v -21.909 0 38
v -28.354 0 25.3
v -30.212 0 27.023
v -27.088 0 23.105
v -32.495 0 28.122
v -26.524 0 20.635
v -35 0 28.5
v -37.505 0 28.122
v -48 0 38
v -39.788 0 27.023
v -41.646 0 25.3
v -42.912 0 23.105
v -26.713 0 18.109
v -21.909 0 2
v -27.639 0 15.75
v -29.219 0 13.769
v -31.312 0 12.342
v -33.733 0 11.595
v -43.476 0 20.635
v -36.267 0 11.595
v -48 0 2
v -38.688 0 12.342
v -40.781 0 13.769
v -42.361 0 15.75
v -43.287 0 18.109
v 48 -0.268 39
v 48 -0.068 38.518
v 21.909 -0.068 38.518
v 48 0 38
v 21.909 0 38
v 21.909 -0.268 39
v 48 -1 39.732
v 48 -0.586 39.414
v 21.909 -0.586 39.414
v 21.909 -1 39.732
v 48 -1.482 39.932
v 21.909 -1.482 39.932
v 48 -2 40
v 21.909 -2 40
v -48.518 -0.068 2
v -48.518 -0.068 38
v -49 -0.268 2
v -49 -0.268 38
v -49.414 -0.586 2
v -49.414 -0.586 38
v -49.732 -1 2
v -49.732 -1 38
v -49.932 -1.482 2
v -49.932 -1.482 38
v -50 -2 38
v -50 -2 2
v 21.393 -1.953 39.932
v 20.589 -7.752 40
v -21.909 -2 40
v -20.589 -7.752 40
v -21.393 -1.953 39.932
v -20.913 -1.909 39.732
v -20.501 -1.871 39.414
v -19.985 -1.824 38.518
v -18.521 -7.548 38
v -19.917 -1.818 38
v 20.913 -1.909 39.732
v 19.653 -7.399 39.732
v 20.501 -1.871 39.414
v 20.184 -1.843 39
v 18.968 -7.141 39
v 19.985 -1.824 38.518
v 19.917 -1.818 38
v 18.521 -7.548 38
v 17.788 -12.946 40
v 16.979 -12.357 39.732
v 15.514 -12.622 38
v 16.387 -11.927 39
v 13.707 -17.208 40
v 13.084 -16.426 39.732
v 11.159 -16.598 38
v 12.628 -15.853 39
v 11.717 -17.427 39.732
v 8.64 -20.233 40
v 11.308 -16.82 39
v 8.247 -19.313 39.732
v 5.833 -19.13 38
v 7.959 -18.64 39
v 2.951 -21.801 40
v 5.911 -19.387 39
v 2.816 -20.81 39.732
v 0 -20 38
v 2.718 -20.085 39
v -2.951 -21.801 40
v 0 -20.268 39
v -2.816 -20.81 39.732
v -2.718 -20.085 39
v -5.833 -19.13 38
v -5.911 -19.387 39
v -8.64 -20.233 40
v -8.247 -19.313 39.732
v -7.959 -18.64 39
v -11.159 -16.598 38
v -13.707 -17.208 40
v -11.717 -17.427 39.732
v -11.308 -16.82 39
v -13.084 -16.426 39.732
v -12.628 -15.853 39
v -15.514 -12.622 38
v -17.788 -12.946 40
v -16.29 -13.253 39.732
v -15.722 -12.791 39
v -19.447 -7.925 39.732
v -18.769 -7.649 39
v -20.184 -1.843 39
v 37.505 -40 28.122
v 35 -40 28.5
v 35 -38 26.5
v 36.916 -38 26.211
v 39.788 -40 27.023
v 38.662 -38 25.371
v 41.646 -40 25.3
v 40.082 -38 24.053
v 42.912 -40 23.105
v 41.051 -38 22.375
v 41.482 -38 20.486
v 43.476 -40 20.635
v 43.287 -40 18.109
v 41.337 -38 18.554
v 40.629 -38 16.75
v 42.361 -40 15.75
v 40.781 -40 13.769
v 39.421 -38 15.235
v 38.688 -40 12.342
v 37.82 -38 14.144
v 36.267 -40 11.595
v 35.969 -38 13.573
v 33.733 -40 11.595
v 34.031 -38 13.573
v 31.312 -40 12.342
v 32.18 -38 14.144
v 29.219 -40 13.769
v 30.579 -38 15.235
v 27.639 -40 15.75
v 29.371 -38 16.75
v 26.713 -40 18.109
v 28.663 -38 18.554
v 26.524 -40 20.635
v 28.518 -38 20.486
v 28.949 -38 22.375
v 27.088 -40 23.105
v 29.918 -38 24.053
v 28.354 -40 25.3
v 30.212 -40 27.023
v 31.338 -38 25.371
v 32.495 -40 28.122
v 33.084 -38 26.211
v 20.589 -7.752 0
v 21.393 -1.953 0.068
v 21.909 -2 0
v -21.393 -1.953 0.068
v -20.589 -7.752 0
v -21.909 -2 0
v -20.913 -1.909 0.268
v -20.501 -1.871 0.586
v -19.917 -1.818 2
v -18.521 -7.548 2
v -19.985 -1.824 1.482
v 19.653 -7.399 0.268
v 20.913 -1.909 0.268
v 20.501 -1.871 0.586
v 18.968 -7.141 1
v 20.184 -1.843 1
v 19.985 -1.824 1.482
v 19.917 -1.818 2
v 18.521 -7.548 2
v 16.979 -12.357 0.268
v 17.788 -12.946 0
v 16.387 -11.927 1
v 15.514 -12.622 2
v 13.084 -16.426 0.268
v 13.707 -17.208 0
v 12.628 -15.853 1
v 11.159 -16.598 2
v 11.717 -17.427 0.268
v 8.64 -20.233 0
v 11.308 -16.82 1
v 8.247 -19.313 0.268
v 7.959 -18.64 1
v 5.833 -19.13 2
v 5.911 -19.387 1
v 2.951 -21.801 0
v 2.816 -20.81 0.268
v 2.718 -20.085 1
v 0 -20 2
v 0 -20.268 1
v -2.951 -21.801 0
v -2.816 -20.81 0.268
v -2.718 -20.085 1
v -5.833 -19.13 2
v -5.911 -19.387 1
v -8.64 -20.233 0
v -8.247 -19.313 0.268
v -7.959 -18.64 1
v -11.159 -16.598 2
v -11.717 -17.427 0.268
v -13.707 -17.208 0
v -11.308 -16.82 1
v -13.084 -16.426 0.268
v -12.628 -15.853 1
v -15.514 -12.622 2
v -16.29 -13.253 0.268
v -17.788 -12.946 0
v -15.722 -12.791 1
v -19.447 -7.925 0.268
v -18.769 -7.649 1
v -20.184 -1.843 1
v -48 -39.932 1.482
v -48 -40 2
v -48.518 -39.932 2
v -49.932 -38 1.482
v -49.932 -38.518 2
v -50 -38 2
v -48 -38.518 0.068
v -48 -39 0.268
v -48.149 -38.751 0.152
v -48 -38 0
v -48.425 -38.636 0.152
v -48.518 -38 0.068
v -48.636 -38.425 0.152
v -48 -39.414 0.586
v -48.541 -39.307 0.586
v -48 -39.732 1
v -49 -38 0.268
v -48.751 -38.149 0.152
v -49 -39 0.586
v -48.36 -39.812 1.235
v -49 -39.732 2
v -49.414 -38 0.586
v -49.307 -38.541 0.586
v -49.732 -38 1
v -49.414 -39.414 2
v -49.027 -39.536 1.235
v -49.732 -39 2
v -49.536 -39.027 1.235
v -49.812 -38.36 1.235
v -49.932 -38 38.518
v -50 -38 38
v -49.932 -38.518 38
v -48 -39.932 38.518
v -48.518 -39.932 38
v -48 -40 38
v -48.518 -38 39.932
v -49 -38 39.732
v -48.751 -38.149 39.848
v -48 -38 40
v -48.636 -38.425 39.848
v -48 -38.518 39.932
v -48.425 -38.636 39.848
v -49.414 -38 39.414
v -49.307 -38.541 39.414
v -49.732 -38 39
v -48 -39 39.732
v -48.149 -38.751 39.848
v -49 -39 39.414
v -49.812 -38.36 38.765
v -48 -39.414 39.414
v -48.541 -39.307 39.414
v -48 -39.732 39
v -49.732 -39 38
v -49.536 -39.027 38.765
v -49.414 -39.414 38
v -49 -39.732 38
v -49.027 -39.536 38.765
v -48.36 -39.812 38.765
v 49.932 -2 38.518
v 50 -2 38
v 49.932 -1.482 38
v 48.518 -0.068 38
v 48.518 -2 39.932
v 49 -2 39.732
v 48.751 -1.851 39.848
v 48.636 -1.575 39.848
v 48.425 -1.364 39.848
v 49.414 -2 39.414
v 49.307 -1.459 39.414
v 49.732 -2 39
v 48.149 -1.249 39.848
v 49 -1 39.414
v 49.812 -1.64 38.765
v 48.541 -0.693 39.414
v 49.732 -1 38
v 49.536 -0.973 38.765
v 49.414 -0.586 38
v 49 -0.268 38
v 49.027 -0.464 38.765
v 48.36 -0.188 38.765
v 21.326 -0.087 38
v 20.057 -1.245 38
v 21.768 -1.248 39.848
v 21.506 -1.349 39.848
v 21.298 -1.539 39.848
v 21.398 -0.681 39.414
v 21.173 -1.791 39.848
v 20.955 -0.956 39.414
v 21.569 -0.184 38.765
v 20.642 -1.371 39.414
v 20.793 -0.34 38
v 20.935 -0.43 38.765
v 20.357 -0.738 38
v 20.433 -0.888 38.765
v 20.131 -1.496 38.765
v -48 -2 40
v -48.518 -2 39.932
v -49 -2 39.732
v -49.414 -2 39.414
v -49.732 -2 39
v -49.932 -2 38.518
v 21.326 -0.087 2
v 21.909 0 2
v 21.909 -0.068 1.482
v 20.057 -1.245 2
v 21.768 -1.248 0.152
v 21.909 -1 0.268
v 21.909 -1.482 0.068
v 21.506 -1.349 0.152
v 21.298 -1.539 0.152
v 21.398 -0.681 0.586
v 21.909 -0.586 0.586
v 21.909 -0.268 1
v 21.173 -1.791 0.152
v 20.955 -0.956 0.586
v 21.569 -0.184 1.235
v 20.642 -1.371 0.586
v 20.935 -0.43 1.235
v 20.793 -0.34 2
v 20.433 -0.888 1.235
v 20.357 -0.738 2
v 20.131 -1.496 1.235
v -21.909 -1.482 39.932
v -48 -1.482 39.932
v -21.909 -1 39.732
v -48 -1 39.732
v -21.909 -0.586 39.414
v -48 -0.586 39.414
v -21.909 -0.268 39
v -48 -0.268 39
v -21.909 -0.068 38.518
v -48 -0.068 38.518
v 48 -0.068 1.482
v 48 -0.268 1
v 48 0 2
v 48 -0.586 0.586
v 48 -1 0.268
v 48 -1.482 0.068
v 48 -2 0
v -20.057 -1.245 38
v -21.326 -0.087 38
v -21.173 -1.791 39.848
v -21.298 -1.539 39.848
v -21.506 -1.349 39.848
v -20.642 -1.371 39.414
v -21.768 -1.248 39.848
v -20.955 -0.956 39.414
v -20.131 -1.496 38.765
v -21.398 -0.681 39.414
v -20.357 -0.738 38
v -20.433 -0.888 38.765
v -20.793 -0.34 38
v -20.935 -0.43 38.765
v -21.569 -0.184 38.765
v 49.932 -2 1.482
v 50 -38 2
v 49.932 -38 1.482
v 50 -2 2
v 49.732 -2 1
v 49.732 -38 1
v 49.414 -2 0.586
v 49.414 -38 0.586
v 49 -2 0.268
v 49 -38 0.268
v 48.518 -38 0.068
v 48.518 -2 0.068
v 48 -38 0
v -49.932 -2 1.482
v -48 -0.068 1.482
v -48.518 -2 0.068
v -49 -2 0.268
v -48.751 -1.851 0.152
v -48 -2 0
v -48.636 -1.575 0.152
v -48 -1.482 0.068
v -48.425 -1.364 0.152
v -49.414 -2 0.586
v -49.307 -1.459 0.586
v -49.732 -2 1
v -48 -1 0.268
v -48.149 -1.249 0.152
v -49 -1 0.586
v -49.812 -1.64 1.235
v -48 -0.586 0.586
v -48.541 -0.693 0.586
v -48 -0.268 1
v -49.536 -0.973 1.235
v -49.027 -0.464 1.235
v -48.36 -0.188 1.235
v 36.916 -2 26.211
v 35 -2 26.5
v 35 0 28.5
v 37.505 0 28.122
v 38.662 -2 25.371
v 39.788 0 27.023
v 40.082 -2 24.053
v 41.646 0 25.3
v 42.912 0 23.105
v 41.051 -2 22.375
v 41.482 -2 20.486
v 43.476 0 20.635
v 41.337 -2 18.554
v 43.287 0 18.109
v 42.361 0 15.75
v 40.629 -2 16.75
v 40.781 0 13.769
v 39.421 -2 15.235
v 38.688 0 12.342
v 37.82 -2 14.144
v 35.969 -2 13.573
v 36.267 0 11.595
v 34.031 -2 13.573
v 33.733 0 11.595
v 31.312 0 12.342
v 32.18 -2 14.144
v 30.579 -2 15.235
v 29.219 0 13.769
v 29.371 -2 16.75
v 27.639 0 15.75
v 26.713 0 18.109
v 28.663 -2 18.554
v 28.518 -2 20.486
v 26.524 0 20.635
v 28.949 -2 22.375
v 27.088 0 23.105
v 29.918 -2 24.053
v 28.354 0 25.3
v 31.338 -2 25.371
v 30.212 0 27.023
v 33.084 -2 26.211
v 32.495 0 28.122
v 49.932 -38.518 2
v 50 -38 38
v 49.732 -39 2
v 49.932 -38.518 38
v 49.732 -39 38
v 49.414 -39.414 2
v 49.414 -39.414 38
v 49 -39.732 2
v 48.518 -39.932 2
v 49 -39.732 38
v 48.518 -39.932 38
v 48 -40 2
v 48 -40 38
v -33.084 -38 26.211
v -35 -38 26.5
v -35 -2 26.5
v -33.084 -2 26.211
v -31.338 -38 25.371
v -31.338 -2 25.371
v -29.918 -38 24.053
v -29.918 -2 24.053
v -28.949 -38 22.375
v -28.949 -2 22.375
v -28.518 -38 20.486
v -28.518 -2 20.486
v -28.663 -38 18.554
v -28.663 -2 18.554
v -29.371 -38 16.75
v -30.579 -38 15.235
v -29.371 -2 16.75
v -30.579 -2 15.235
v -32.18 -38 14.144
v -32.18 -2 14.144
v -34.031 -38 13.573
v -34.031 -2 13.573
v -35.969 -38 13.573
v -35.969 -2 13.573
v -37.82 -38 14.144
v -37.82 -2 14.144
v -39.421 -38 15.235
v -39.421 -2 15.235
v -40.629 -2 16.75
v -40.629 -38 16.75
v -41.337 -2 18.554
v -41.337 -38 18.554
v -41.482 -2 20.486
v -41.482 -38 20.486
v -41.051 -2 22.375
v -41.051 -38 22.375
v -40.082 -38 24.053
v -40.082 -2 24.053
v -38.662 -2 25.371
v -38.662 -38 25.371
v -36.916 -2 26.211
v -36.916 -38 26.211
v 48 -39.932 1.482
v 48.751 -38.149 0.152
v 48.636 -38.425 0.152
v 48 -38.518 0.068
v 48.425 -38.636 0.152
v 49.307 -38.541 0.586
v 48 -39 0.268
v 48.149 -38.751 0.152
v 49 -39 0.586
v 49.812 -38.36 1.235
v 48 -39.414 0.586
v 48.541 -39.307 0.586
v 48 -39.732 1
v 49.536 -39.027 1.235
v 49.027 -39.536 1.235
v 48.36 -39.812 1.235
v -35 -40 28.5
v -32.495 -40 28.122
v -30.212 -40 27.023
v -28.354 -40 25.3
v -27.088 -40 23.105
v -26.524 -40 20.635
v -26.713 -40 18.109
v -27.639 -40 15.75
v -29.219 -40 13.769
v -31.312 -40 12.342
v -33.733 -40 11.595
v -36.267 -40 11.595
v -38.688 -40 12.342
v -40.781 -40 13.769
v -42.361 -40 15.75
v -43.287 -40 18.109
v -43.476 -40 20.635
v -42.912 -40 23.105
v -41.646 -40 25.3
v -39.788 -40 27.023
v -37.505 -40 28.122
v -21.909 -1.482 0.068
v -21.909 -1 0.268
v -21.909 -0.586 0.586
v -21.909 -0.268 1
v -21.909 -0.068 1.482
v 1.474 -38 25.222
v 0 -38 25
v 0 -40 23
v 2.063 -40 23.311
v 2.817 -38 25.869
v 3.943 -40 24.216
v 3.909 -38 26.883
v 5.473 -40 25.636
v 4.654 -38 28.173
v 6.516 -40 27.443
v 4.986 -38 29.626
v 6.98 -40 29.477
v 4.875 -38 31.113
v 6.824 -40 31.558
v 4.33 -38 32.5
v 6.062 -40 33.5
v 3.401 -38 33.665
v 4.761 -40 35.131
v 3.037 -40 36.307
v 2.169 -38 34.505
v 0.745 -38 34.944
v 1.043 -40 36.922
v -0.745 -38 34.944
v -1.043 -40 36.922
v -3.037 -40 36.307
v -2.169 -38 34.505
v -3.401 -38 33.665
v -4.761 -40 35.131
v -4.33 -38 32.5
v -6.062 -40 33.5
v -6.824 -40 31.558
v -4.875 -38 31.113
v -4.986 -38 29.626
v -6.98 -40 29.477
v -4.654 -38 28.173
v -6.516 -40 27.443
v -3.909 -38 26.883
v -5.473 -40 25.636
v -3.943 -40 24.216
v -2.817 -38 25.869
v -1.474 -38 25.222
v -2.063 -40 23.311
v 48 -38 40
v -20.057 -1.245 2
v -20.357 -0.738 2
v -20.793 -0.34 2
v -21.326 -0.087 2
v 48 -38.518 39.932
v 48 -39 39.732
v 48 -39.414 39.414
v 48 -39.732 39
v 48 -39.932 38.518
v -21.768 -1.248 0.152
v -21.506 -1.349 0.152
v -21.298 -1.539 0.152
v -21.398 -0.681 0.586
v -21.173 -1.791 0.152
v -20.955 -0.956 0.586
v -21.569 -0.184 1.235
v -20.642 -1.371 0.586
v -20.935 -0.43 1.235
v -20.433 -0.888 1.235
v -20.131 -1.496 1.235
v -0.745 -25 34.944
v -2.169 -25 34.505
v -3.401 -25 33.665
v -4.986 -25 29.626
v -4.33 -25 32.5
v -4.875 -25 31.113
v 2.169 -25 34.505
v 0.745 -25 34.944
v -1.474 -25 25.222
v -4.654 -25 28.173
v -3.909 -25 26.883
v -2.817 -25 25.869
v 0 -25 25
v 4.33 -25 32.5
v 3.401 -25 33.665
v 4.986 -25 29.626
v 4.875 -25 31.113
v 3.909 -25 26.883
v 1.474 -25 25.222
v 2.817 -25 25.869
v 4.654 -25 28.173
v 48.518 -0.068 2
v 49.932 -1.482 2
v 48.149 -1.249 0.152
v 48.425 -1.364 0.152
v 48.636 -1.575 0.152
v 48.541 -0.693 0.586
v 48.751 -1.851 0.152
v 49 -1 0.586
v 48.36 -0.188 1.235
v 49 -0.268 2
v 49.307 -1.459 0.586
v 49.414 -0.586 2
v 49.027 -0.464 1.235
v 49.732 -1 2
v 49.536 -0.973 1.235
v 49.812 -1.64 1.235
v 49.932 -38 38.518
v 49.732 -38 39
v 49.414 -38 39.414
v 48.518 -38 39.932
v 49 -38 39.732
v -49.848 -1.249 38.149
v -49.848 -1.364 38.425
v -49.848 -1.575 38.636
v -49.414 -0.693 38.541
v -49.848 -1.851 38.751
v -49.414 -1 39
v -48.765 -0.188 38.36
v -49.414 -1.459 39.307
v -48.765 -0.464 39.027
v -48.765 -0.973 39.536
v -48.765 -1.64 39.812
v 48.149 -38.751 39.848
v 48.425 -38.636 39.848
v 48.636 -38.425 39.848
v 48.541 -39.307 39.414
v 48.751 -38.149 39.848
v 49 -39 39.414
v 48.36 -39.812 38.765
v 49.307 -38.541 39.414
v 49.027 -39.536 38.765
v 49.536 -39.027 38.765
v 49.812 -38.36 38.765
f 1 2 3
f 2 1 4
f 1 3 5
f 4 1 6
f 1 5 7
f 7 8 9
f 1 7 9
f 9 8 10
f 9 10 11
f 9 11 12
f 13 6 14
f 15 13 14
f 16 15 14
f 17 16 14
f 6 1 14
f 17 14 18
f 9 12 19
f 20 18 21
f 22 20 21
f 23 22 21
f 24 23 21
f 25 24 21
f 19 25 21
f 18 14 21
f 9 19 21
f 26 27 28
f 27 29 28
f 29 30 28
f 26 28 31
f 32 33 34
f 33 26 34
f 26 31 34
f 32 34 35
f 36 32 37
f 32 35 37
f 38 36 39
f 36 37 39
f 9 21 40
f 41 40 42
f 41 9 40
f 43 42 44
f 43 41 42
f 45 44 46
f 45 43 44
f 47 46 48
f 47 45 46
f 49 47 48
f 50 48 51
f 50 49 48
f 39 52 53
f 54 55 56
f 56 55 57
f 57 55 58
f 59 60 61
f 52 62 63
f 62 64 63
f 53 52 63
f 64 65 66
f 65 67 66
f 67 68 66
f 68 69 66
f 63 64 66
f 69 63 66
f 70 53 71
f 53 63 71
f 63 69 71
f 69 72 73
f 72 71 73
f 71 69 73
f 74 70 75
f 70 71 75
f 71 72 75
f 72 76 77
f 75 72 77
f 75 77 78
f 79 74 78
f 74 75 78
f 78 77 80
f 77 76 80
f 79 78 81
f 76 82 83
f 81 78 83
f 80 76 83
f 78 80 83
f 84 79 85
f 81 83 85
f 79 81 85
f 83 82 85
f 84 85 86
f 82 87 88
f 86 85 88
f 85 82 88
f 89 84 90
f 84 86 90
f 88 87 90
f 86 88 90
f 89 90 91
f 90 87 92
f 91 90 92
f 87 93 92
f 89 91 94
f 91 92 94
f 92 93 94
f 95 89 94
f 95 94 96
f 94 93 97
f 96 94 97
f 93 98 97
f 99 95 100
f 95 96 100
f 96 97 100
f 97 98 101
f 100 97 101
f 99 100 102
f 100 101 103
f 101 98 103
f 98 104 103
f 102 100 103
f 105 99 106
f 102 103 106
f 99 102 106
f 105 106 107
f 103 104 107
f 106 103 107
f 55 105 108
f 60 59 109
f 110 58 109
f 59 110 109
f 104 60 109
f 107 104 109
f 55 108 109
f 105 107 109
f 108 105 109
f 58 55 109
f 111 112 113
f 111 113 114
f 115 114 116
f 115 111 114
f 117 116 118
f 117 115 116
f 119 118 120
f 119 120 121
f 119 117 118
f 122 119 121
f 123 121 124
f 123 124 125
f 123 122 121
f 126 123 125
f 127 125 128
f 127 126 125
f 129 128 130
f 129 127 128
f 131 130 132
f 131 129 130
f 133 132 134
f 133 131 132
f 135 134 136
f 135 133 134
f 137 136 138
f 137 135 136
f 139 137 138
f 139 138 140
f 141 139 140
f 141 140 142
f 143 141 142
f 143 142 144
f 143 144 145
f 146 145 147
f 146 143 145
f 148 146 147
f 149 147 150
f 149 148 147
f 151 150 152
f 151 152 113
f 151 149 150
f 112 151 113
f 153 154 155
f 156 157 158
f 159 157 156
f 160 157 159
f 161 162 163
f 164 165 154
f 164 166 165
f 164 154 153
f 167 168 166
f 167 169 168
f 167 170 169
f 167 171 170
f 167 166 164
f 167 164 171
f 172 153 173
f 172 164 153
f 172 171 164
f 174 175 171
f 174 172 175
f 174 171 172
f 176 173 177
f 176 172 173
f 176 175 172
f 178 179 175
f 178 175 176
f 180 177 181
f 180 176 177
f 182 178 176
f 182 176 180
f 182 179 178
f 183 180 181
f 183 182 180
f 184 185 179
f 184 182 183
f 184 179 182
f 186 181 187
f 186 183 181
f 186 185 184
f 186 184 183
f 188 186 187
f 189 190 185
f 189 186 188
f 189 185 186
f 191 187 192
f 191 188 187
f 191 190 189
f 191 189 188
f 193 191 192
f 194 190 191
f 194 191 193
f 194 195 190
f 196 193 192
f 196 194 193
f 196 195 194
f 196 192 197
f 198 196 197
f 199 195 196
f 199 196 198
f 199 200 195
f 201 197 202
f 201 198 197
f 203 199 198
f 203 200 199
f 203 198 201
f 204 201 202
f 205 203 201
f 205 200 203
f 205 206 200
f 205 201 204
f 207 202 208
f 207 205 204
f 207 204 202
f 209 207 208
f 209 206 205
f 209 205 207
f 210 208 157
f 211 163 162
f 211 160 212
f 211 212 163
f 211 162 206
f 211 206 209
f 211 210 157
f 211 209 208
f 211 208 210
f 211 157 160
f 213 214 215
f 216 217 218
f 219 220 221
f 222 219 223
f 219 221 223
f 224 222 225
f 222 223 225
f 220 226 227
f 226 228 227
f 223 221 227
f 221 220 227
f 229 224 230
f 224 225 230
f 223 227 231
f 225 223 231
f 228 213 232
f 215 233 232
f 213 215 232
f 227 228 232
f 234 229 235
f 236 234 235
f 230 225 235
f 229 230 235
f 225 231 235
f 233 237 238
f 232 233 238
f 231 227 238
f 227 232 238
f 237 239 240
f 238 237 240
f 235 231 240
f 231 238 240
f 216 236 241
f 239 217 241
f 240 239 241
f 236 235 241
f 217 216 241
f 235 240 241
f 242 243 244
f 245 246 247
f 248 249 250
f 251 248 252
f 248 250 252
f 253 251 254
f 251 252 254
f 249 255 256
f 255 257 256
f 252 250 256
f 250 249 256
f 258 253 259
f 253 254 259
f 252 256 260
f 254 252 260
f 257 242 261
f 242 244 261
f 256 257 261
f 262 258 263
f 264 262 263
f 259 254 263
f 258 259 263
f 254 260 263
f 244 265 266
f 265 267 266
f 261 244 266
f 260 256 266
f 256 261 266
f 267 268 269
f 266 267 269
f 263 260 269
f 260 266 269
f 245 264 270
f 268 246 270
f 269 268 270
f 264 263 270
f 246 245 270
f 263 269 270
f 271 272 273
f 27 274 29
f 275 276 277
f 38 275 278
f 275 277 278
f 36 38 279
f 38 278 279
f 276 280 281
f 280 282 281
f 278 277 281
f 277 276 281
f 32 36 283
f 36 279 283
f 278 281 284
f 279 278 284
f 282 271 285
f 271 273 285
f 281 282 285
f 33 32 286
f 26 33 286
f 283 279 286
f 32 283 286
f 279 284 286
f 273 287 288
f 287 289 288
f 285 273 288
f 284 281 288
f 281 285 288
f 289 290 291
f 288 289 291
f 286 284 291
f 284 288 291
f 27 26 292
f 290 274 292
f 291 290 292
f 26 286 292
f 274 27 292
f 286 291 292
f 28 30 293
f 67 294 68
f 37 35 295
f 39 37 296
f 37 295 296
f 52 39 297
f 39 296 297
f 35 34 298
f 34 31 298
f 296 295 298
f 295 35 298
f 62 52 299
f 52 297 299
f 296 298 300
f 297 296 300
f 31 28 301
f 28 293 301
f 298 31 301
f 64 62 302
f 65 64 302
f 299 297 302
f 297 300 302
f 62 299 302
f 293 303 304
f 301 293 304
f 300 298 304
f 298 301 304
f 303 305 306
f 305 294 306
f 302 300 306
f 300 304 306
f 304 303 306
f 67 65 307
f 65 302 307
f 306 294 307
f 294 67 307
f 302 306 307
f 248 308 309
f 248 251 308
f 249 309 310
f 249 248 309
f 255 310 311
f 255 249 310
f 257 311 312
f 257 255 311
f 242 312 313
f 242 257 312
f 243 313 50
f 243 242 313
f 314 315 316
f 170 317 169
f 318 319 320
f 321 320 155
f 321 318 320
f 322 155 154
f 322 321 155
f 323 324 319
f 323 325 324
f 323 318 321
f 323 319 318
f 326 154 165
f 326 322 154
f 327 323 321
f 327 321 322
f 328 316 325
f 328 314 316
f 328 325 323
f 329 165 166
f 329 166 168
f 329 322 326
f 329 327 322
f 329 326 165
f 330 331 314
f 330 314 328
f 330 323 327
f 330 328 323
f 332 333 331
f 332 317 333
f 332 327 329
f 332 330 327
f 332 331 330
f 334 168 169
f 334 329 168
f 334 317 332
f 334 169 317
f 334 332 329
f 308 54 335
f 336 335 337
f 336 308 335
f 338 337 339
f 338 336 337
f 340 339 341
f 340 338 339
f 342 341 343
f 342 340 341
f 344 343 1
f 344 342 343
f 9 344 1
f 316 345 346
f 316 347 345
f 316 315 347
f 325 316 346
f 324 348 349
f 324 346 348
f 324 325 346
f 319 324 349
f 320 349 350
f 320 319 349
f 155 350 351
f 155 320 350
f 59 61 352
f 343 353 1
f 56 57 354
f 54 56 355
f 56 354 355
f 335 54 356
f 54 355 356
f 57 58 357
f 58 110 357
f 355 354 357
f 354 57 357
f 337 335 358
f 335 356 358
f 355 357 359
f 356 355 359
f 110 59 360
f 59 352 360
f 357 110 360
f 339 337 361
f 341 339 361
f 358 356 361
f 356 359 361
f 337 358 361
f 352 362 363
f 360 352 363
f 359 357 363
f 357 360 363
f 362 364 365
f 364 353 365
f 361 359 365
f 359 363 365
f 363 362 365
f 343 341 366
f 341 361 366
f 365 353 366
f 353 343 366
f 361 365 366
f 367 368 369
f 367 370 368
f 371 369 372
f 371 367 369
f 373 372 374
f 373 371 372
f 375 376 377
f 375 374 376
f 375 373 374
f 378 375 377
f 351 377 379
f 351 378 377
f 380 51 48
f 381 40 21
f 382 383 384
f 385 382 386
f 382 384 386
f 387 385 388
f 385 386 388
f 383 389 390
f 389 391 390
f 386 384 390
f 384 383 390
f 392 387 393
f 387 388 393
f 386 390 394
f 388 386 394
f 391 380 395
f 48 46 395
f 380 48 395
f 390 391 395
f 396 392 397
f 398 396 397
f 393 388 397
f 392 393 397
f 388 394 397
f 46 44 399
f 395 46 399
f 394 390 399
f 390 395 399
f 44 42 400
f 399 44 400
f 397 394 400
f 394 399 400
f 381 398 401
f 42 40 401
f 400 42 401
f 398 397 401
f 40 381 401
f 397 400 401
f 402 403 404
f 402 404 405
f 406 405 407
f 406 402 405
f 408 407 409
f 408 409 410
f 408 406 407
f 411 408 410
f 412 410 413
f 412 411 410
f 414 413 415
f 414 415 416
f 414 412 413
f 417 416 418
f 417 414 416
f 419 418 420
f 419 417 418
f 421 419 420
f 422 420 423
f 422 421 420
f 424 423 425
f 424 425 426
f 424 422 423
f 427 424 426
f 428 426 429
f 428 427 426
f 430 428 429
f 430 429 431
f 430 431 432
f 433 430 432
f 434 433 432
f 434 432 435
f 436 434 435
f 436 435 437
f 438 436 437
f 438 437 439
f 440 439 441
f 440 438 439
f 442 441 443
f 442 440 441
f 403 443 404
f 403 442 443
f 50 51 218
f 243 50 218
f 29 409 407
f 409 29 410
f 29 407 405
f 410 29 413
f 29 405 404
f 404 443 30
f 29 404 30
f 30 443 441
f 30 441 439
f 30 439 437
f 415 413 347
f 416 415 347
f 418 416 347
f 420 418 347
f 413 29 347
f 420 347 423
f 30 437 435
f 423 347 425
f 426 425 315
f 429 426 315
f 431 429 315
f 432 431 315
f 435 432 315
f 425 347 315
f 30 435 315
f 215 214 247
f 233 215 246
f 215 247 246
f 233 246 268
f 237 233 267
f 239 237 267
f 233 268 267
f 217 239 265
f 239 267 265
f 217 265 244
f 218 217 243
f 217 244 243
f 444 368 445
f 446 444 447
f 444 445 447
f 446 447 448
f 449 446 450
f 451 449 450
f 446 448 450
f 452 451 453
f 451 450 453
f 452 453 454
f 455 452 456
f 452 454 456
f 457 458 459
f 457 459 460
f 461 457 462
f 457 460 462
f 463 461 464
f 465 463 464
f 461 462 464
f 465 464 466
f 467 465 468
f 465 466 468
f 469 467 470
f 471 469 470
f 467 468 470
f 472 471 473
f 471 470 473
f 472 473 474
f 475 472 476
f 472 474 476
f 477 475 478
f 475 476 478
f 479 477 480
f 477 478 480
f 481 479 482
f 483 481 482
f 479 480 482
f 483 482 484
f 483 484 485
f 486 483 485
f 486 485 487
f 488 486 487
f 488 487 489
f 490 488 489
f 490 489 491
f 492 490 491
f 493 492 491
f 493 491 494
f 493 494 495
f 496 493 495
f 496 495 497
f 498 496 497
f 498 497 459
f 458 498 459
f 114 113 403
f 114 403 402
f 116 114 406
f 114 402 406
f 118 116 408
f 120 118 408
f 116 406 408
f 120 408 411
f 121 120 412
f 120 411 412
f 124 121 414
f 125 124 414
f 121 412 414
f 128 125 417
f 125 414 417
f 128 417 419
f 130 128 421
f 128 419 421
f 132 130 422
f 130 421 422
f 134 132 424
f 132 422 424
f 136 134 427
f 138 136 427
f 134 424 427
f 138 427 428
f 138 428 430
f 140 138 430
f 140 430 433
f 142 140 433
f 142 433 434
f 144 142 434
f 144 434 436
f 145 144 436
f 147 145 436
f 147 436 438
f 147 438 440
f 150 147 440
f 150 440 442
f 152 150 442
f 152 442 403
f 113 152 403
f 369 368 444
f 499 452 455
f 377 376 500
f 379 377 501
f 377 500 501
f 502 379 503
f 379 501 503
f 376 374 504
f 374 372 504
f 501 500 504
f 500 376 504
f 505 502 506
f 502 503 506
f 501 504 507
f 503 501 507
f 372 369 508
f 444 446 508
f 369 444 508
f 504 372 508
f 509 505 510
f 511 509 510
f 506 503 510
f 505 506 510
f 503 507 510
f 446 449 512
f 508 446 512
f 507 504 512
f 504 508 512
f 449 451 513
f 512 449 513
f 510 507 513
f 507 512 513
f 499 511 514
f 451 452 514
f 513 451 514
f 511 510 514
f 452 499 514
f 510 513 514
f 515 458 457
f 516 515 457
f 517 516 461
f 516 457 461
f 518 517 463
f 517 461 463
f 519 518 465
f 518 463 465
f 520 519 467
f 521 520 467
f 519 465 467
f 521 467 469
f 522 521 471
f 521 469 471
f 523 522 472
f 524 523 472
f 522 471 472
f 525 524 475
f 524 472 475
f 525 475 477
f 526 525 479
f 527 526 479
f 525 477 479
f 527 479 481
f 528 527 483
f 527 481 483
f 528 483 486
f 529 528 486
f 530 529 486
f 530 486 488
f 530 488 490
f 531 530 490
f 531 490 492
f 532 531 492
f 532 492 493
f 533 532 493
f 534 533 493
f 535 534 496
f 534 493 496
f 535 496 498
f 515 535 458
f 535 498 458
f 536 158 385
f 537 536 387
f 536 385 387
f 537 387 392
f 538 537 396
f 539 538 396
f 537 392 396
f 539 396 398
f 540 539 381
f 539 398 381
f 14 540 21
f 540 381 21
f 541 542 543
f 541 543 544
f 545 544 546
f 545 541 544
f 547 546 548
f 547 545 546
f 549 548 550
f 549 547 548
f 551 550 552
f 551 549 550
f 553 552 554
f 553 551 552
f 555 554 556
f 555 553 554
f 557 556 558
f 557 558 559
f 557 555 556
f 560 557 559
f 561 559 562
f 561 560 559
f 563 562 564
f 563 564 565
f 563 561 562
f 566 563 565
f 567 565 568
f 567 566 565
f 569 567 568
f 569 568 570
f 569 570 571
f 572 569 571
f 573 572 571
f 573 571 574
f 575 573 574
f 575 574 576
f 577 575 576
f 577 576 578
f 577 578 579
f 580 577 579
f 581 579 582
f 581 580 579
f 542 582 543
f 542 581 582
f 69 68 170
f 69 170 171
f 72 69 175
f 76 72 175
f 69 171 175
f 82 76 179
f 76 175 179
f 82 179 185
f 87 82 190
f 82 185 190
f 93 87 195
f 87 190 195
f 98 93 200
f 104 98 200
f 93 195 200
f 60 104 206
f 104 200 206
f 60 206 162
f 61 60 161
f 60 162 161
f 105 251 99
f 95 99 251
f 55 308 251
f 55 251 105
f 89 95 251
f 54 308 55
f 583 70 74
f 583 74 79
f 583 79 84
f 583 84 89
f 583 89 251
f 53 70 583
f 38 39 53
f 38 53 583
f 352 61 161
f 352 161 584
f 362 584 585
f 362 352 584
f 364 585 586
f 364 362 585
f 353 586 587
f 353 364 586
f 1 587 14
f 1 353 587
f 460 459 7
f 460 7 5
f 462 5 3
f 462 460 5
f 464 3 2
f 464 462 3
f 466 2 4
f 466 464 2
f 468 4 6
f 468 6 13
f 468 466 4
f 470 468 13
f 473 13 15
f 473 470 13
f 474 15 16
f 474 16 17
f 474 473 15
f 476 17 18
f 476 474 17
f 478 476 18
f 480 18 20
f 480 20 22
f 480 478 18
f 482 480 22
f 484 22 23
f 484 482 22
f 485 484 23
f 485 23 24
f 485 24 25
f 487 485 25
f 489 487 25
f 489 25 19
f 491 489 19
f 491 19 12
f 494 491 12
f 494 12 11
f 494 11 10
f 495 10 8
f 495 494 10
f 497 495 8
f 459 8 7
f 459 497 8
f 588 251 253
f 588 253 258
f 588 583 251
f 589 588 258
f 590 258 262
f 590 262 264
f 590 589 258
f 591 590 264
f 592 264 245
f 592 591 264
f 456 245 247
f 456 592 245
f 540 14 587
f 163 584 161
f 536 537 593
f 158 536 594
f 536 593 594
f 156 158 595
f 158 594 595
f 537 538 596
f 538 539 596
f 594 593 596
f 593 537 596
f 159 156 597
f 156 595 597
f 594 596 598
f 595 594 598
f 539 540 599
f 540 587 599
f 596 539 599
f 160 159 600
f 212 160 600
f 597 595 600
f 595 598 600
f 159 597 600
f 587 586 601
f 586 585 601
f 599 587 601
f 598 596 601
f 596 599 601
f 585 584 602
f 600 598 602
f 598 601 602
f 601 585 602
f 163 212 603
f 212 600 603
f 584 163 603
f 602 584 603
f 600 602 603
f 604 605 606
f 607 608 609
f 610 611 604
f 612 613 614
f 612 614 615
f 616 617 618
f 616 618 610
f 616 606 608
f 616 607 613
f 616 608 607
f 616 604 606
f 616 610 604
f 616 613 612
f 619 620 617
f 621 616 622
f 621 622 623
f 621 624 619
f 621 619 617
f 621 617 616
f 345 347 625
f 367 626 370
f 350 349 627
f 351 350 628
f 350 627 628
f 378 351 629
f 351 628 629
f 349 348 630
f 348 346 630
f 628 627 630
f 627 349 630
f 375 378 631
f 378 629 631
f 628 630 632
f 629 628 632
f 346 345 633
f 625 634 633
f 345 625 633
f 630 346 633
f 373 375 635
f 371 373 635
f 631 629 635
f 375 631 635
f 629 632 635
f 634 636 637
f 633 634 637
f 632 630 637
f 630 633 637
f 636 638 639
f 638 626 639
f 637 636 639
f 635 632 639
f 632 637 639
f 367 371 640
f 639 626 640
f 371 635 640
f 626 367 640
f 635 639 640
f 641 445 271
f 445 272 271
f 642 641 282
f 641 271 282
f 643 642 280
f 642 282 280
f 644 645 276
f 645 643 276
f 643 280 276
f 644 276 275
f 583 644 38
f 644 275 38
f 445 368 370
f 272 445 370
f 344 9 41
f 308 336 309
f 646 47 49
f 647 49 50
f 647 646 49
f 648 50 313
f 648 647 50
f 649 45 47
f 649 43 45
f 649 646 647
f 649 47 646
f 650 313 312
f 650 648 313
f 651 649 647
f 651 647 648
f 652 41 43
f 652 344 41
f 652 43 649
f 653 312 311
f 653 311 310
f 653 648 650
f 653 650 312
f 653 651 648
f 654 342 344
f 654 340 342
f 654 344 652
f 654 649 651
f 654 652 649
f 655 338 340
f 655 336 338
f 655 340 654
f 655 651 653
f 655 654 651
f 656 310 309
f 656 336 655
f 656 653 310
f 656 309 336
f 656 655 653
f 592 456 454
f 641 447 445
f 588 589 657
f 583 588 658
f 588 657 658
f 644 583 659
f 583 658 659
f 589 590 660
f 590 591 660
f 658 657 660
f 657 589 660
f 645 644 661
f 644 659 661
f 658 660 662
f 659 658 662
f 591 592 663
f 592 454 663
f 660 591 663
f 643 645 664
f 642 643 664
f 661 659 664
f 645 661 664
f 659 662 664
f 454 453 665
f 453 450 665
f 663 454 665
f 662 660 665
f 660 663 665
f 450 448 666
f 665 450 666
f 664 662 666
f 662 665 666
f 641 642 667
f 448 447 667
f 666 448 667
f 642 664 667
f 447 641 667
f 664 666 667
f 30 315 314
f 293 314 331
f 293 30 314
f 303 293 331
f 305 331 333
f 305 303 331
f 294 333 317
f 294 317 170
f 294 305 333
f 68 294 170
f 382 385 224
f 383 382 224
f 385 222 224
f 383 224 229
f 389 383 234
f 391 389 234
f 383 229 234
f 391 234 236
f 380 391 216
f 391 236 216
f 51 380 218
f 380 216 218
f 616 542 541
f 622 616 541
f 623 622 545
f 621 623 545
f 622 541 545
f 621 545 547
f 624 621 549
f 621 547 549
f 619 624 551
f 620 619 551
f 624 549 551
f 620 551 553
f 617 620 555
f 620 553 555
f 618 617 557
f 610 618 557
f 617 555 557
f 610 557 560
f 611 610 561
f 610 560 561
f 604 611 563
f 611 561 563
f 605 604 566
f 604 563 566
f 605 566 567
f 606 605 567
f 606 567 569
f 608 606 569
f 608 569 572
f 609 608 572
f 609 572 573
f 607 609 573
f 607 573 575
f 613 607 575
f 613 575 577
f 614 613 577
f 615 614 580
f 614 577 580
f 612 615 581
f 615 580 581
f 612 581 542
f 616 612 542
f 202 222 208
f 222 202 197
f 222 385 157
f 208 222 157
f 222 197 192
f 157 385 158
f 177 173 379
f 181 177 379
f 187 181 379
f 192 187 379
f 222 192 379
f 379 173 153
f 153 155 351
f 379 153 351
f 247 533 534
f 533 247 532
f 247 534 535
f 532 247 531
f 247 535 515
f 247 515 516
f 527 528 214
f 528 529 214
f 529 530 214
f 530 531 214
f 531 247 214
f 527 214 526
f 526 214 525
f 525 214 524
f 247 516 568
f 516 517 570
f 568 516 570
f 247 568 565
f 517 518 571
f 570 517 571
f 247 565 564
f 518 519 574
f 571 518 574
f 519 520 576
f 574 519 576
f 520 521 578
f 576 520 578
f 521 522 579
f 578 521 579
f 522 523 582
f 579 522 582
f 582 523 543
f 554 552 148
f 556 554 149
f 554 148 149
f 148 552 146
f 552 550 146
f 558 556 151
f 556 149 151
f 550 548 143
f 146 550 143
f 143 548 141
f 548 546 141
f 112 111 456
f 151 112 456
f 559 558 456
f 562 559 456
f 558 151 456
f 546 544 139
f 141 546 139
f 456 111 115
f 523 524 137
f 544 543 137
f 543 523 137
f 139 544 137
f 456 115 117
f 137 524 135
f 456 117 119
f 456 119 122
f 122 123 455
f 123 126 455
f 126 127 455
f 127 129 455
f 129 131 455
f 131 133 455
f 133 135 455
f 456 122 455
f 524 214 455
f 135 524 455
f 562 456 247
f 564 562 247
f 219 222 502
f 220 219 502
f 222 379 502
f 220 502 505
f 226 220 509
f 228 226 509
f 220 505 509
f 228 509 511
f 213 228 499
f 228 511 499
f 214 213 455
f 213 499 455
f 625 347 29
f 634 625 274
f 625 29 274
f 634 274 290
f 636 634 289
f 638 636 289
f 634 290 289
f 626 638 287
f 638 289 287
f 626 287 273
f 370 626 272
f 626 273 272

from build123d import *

# Parameters (mm, degrees)
DODANIE_WYCI_GNI_CIE1_DEPTH = 40
WYTNIJ_WYCI_GNI_CIE3_REACH  = 77.498
SZKIC2_R                    = 6.5
SZKIC3_R                    = 5
WYTNIJ_WYCI_GNI_CIE6_DEPTH  = 15
SFAZOWANIE1_SIZE            = 2
ZAOKR_GLENIE1_R             = 2


with BuildPart() as part:
    # Szkic1 → Dodanie-wyciągnięcie1 (new body)
    with BuildSketch(Plane.XY):
        with BuildLine():
            Line((50, 0), (20, 0))
            ThreePointArc((20, 0), (0, -20), (-20, 0))
            Line((-20, 0), (-50, 0))
            Line((-50, 0), (-50, -40))
            Line((-50, -40), (50, -40))
            Line((50, -40), (50, 0))
        make_face()
    extrude(amount=DODANIE_WYCI_GNI_CIE1_DEPTH)

    # Szkic2 → Wytnij-wyciągnięcie3 (cut, up to next)
    with BuildSketch(Plane(origin=(0, 0, 0), x_dir=(1, 0, 0), z_dir=(0, 1, 0)), mode=Mode.PRIVATE) as wytnij_wyci_gni_cie3_sk1:
        with Locations(Location((-35, -20, 0), (0, 0, 270))):
            Circle(SZKIC2_R)
    wytnij_wyci_gni_cie3_tool1 = extrude(wytnij_wyci_gni_cie3_sk1.sketch, amount=-WYTNIJ_WYCI_GNI_CIE3_REACH, mode=Mode.PRIVATE) & part.part
    # Szkic2 → Wytnij-wyciągnięcie3 (cut, up to next)
    with BuildSketch(Plane(origin=(0, 0, 0), x_dir=(1, 0, 0), z_dir=(0, 1, 0)), mode=Mode.PRIVATE) as wytnij_wyci_gni_cie3_sk2:
        with Locations(Location((35, -20, 0), (0, 0, 270))):
            Circle(SZKIC2_R)
    wytnij_wyci_gni_cie3_tool2 = extrude(wytnij_wyci_gni_cie3_sk2.sketch, amount=-WYTNIJ_WYCI_GNI_CIE3_REACH, mode=Mode.PRIVATE) & part.part
    add(wytnij_wyci_gni_cie3_tool1.solids().sort_by_distance((-35, 0, 20))[0], mode=Mode.SUBTRACT)
    add(wytnij_wyci_gni_cie3_tool2.solids().sort_by_distance((35, 0, 20))[0], mode=Mode.SUBTRACT)

    # Szkic3 → Wytnij-wyciągnięcie6 (cut)
    with BuildSketch(Plane(origin=(0, -40, 0), x_dir=(-1, 0, 0), z_dir=(0, -1, 0))):
        with Locations(Location((0, -30, 0), (0, 0, 90))):
            Circle(SZKIC3_R)
    extrude(amount=-WYTNIJ_WYCI_GNI_CIE6_DEPTH, mode=Mode.SUBTRACT)

    # Sfazowanie1
    sfazowanie1_edges = [part.edges().sort_by_distance(p)[0] for p in [
        (-35, 0, 13.5),
        (-35, -40, 13.5),
        (35, 0, 13.5),
        (35, -40, 13.5),
        (0, -40, 35),
    ]]
    chamfer(sfazowanie1_edges, length=SFAZOWANIE1_SIZE)

    # Zaokrąglenie1
    zaokr_glenie1_edges = [part.edges().sort_by_distance(p)[0] for p in [
        (0, -20, 0),
        (-35, 0, 40),
        (20, 0, 20),
        (50, 0, 20),
        (50, -40, 20),
        (-50, -40, 20),
        (-50, 0, 20),
        (-20, 0, 20),
        (-50, -20, 40),
        (0, -40, 40),
        (50, -20, 40),
        (35, 0, 40),
        (0, -20, 40),
        (35, 0, 0),
        (50, -20, 0),
        (0, -40, 0),
        (-50, -20, 0),
        (-35, 0, 0),
    ]]
    fillet(zaokr_glenie1_edges, radius=ZAOKR_GLENIE1_R)


solid = part.part
